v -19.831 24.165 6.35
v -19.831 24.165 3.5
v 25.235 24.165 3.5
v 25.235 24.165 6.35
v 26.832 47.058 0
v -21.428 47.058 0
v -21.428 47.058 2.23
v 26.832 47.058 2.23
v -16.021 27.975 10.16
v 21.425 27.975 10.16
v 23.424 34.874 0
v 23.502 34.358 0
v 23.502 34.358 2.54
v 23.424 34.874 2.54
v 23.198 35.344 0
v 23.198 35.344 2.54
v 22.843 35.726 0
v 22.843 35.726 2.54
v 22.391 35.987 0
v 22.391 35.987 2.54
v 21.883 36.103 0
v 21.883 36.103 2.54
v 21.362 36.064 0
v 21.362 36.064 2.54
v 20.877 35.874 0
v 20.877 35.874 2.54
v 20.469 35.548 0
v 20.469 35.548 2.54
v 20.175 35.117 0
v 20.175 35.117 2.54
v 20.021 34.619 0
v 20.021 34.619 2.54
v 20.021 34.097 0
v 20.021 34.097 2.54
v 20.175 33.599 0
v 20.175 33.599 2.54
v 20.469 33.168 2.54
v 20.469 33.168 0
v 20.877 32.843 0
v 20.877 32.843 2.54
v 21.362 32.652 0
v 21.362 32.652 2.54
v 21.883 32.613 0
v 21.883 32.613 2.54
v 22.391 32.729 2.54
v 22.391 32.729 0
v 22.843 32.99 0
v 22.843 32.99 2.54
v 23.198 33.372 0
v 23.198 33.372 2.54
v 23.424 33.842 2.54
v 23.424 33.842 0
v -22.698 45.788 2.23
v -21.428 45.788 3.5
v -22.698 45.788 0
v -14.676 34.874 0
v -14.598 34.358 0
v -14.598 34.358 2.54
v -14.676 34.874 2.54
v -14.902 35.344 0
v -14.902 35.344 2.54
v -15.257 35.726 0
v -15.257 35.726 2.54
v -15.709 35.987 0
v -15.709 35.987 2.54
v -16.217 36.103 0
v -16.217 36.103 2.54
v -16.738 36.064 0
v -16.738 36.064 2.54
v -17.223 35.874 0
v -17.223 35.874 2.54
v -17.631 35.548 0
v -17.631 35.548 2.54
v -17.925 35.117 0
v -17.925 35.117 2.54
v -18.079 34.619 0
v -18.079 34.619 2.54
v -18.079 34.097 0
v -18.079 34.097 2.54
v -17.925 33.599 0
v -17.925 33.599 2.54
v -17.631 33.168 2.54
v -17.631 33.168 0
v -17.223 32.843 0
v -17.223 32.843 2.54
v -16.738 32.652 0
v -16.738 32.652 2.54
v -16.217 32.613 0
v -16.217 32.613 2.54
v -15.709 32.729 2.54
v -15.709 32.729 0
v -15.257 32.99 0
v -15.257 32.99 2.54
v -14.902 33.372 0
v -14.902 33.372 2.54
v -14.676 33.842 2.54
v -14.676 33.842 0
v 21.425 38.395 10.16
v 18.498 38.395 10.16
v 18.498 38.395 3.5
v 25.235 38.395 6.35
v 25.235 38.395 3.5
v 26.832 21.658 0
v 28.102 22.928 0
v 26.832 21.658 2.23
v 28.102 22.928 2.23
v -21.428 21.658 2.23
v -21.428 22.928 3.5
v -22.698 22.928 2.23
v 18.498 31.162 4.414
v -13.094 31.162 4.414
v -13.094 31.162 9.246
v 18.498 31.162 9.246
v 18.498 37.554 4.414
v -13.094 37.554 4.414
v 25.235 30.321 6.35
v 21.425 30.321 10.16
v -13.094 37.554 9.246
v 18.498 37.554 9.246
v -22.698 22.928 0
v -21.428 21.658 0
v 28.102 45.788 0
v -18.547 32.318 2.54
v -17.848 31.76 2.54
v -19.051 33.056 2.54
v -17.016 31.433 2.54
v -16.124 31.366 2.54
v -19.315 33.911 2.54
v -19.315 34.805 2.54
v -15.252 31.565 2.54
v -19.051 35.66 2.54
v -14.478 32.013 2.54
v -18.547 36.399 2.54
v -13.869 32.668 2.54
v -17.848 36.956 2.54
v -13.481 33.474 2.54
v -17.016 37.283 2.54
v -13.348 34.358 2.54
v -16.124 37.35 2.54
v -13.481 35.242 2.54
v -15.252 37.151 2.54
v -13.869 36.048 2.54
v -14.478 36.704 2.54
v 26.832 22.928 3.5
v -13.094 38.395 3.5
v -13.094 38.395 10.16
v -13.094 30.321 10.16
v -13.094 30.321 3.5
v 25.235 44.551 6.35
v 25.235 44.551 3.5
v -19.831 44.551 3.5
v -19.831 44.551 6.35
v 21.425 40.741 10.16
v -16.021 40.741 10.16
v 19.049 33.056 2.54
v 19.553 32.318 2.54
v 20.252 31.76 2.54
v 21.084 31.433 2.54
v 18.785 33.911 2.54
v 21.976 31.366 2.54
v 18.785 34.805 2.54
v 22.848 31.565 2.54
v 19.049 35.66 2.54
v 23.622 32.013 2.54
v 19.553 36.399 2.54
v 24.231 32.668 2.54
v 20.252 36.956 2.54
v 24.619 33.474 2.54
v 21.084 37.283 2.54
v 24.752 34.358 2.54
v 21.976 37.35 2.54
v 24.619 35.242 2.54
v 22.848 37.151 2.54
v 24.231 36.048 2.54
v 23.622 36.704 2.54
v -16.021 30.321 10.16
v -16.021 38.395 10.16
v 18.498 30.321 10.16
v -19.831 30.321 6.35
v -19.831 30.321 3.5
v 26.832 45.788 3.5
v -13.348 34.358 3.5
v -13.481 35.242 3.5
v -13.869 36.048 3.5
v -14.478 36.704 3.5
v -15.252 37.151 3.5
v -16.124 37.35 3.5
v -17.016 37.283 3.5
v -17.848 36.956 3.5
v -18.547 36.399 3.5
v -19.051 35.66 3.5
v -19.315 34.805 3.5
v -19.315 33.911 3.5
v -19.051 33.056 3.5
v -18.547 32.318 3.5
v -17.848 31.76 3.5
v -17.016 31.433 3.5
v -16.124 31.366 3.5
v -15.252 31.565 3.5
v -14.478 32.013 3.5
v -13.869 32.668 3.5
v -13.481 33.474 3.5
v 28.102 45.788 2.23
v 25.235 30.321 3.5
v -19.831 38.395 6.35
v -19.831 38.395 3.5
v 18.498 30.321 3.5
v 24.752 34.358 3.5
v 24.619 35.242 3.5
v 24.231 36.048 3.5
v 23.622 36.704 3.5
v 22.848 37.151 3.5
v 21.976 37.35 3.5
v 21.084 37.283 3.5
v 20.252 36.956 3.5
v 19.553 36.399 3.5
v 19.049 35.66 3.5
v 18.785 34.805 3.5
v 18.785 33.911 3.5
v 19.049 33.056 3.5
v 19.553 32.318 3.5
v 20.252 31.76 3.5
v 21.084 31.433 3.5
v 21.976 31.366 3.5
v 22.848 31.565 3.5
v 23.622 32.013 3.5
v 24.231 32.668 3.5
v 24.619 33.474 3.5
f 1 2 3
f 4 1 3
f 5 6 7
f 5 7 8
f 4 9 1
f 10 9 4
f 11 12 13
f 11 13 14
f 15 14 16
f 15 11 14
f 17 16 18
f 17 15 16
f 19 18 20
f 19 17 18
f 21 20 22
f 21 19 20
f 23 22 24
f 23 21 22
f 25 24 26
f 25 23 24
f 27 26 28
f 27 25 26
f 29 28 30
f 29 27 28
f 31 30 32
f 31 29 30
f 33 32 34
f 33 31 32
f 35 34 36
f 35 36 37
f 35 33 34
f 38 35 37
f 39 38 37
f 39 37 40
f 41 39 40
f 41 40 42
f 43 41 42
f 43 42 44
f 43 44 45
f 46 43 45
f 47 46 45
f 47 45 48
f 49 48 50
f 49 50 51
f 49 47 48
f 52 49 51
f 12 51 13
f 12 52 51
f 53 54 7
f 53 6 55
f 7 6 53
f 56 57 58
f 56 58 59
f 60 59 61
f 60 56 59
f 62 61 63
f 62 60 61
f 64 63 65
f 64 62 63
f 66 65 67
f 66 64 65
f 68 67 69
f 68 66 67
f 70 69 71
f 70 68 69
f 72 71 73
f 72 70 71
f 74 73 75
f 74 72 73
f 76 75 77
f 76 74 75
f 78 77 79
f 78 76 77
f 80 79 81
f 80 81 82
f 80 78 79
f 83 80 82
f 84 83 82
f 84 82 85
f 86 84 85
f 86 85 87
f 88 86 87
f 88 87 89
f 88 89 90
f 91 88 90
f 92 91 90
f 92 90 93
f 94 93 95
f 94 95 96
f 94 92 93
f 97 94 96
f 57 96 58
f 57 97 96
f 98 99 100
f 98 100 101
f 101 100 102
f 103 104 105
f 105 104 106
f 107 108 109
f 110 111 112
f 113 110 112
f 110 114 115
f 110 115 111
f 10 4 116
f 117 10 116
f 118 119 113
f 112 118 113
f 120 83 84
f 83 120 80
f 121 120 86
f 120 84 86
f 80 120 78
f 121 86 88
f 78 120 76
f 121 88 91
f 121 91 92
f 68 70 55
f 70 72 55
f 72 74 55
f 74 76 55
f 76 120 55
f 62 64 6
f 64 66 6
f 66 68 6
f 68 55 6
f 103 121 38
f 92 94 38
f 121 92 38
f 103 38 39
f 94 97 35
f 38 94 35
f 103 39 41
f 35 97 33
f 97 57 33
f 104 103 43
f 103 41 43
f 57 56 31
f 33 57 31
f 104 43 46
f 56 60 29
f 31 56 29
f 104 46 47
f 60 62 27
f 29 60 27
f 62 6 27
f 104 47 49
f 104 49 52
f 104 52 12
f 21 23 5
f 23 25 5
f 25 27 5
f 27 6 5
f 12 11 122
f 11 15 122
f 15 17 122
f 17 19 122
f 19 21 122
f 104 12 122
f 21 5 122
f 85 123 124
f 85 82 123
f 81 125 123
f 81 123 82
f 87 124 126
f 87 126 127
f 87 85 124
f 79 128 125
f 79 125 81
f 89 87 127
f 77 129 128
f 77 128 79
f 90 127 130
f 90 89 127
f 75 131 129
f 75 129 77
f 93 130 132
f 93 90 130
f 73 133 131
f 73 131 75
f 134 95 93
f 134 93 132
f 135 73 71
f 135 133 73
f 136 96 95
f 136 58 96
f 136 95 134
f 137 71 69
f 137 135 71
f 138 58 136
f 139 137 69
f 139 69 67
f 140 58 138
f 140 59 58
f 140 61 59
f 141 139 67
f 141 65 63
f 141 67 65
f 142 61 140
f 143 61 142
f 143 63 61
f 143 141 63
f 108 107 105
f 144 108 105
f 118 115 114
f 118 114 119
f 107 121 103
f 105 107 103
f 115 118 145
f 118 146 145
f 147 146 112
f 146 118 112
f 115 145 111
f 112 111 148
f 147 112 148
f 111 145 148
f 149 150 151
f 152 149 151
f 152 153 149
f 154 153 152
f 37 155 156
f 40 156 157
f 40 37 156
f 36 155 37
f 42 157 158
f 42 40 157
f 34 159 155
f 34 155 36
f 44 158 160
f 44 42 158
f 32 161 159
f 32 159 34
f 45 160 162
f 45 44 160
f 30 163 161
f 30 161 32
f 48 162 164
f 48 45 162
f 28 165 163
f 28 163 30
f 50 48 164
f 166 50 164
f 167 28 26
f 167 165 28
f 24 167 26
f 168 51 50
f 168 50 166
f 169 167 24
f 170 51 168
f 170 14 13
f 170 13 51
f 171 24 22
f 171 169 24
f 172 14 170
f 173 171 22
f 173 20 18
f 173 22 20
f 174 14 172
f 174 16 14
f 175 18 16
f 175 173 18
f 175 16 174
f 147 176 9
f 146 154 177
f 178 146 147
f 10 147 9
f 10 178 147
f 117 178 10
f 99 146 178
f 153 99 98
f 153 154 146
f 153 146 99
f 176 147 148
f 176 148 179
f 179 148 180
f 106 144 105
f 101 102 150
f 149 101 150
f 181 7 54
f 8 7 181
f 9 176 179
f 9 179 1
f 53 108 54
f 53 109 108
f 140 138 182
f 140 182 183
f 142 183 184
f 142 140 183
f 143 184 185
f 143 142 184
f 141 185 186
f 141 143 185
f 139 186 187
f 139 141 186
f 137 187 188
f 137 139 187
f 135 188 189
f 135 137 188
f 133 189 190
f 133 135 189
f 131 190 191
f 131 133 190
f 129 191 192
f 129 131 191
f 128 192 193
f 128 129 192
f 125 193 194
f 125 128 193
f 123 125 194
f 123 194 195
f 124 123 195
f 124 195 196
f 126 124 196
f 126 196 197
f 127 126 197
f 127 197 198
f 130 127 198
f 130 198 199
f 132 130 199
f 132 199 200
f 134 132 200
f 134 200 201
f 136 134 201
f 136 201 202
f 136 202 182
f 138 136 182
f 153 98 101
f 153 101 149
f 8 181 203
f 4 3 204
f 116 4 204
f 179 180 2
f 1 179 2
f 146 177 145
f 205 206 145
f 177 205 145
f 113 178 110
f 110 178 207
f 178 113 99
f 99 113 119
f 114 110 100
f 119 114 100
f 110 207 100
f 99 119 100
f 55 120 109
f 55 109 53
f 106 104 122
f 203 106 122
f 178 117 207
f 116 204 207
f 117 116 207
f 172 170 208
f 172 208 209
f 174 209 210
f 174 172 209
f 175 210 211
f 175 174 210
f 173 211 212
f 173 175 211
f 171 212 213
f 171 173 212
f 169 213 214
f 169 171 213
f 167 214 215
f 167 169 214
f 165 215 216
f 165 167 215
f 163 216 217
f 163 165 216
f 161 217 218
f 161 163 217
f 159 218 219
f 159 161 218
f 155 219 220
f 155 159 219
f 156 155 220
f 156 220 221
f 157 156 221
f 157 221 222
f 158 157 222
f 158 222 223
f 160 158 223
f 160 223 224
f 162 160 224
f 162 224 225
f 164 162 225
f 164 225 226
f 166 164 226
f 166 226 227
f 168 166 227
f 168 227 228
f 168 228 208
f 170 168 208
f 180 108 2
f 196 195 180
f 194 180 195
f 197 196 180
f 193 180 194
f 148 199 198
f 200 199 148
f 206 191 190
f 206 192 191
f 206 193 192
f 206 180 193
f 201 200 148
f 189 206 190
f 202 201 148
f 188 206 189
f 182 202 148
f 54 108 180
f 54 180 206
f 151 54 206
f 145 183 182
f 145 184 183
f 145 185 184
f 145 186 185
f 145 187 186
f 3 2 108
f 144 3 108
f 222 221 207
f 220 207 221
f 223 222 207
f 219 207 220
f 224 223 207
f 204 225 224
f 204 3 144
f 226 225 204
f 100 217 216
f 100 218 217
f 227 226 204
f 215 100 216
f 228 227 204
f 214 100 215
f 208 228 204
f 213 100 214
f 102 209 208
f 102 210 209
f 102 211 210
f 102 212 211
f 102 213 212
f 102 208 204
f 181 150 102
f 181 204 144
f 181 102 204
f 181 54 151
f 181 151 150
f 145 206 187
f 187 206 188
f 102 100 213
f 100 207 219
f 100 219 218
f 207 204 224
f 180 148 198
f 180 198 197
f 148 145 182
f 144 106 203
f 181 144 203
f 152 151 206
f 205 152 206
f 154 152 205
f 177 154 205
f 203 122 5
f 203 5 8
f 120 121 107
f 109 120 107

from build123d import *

# Parameters (mm, degrees)
F0_W     = 50.8
F0_H     = 25.4
F0_R     = 3
F1_DEPTH = 3.5
F2_DEPTH = 10.16
F3_SIZE  = 1.27
F4_SIZE  = 3.81
F0_R_2   = 1.75
F5_DEPTH = 2.54
F6_W     = 6.391182
F6_H     = 4.83196
F7_DEPTH = 31.592


with BuildPart() as f1:
    # F0 (on Top) → F1 (new body)
    with BuildSketch(Plane.XY):
        with Locations((2.701852, 34.358082)):
            Rectangle(F0_W, F0_H)
        Polygon((-19.831223, 38.395144), (-19.831223, 44.550914), (25.234927, 44.550914), (25.234927, 38.395144), (18.497852, 38.395144), (18.497852, 30.32102), (25.234927, 30.32102), (25.234927, 24.16525), (-19.831223, 24.16525), (-19.831223, 30.32102), (-13.094148, 30.32102), (-13.094148, 38.395144), align=None, mode=Mode.SUBTRACT)
        with Locations((-16.348148, 34.358082)):
            Circle(F0_R, mode=Mode.SUBTRACT)
        with Locations((21.751852, 34.358082)):
            Circle(F0_R, mode=Mode.SUBTRACT)
    extrude(amount=F1_DEPTH)

    # F0 (on Top) → F2 (join)
    with BuildSketch(Plane.XY):
        Polygon((25.234927, 44.550914), (-19.831223, 44.550914), (-19.831223, 38.395144), (-13.094148, 38.395144), (-13.094148, 30.32102), (-19.831223, 30.32102), (-19.831223, 24.16525), (25.234927, 24.16525), (25.234927, 30.32102), (18.497852, 30.32102), (18.497852, 38.395144), (25.234927, 38.395144), align=None)
    extrude(amount=F2_DEPTH)

    # F3
    f3_edges = [f1.edges().sort_by_distance(p)[0] for p in [
        (-22.698148, 34.358082, 3.5),
        (2.701852, 21.658082, 3.5),
        (2.701852, 47.058082, 3.5),
        (28.101852, 34.358082, 3.5),
        (-22.698148, 47.058082, 1.75),
        (-22.698148, 21.658082, 1.75),
        (28.101852, 21.658082, 1.75),
        (28.101852, 47.058082, 1.75),
    ]]
    chamfer(f3_edges, length=F3_SIZE)

    # F4
    f4_edges = [f1.edges().sort_by_distance(p)[0] for p in [
        (25.234927, 41.473029, 10.16),
        (2.701852, 44.550914, 10.16),
        (25.234927, 27.243135, 10.16),
        (2.701852, 24.16525, 10.16),
        (-19.831223, 41.473029, 10.16),
        (-19.831223, 27.243135, 10.16),
    ]]
    chamfer(f4_edges, length=F4_SIZE)

    # F0 (on Top) → F5 (join)
    with BuildSketch(Plane.XY):
        with Locations((21.751852, 34.358082)):
            Circle(F0_R)
        with Locations((21.751852, 34.358082)):
            Circle(F0_R_2, mode=Mode.SUBTRACT)
        with Locations((-16.348148, 34.358082)):
            Circle(F0_R)
        with Locations((-16.348148, 34.358082)):
            Circle(F0_R_2, mode=Mode.SUBTRACT)
    extrude(amount=F5_DEPTH)

    # F6 (on face) → F7 (cut, through all)
    with BuildSketch(Plane(origin=(-13.094148, 0, 0), x_dir=(0, -1, 0), z_dir=(-1, 0, 0))):
        with Locations((-34.358082, 6.83)):
            Rectangle(F6_W, F6_H)
    extrude(amount=-F7_DEPTH, mode=Mode.SUBTRACT)


solid = f1.part
